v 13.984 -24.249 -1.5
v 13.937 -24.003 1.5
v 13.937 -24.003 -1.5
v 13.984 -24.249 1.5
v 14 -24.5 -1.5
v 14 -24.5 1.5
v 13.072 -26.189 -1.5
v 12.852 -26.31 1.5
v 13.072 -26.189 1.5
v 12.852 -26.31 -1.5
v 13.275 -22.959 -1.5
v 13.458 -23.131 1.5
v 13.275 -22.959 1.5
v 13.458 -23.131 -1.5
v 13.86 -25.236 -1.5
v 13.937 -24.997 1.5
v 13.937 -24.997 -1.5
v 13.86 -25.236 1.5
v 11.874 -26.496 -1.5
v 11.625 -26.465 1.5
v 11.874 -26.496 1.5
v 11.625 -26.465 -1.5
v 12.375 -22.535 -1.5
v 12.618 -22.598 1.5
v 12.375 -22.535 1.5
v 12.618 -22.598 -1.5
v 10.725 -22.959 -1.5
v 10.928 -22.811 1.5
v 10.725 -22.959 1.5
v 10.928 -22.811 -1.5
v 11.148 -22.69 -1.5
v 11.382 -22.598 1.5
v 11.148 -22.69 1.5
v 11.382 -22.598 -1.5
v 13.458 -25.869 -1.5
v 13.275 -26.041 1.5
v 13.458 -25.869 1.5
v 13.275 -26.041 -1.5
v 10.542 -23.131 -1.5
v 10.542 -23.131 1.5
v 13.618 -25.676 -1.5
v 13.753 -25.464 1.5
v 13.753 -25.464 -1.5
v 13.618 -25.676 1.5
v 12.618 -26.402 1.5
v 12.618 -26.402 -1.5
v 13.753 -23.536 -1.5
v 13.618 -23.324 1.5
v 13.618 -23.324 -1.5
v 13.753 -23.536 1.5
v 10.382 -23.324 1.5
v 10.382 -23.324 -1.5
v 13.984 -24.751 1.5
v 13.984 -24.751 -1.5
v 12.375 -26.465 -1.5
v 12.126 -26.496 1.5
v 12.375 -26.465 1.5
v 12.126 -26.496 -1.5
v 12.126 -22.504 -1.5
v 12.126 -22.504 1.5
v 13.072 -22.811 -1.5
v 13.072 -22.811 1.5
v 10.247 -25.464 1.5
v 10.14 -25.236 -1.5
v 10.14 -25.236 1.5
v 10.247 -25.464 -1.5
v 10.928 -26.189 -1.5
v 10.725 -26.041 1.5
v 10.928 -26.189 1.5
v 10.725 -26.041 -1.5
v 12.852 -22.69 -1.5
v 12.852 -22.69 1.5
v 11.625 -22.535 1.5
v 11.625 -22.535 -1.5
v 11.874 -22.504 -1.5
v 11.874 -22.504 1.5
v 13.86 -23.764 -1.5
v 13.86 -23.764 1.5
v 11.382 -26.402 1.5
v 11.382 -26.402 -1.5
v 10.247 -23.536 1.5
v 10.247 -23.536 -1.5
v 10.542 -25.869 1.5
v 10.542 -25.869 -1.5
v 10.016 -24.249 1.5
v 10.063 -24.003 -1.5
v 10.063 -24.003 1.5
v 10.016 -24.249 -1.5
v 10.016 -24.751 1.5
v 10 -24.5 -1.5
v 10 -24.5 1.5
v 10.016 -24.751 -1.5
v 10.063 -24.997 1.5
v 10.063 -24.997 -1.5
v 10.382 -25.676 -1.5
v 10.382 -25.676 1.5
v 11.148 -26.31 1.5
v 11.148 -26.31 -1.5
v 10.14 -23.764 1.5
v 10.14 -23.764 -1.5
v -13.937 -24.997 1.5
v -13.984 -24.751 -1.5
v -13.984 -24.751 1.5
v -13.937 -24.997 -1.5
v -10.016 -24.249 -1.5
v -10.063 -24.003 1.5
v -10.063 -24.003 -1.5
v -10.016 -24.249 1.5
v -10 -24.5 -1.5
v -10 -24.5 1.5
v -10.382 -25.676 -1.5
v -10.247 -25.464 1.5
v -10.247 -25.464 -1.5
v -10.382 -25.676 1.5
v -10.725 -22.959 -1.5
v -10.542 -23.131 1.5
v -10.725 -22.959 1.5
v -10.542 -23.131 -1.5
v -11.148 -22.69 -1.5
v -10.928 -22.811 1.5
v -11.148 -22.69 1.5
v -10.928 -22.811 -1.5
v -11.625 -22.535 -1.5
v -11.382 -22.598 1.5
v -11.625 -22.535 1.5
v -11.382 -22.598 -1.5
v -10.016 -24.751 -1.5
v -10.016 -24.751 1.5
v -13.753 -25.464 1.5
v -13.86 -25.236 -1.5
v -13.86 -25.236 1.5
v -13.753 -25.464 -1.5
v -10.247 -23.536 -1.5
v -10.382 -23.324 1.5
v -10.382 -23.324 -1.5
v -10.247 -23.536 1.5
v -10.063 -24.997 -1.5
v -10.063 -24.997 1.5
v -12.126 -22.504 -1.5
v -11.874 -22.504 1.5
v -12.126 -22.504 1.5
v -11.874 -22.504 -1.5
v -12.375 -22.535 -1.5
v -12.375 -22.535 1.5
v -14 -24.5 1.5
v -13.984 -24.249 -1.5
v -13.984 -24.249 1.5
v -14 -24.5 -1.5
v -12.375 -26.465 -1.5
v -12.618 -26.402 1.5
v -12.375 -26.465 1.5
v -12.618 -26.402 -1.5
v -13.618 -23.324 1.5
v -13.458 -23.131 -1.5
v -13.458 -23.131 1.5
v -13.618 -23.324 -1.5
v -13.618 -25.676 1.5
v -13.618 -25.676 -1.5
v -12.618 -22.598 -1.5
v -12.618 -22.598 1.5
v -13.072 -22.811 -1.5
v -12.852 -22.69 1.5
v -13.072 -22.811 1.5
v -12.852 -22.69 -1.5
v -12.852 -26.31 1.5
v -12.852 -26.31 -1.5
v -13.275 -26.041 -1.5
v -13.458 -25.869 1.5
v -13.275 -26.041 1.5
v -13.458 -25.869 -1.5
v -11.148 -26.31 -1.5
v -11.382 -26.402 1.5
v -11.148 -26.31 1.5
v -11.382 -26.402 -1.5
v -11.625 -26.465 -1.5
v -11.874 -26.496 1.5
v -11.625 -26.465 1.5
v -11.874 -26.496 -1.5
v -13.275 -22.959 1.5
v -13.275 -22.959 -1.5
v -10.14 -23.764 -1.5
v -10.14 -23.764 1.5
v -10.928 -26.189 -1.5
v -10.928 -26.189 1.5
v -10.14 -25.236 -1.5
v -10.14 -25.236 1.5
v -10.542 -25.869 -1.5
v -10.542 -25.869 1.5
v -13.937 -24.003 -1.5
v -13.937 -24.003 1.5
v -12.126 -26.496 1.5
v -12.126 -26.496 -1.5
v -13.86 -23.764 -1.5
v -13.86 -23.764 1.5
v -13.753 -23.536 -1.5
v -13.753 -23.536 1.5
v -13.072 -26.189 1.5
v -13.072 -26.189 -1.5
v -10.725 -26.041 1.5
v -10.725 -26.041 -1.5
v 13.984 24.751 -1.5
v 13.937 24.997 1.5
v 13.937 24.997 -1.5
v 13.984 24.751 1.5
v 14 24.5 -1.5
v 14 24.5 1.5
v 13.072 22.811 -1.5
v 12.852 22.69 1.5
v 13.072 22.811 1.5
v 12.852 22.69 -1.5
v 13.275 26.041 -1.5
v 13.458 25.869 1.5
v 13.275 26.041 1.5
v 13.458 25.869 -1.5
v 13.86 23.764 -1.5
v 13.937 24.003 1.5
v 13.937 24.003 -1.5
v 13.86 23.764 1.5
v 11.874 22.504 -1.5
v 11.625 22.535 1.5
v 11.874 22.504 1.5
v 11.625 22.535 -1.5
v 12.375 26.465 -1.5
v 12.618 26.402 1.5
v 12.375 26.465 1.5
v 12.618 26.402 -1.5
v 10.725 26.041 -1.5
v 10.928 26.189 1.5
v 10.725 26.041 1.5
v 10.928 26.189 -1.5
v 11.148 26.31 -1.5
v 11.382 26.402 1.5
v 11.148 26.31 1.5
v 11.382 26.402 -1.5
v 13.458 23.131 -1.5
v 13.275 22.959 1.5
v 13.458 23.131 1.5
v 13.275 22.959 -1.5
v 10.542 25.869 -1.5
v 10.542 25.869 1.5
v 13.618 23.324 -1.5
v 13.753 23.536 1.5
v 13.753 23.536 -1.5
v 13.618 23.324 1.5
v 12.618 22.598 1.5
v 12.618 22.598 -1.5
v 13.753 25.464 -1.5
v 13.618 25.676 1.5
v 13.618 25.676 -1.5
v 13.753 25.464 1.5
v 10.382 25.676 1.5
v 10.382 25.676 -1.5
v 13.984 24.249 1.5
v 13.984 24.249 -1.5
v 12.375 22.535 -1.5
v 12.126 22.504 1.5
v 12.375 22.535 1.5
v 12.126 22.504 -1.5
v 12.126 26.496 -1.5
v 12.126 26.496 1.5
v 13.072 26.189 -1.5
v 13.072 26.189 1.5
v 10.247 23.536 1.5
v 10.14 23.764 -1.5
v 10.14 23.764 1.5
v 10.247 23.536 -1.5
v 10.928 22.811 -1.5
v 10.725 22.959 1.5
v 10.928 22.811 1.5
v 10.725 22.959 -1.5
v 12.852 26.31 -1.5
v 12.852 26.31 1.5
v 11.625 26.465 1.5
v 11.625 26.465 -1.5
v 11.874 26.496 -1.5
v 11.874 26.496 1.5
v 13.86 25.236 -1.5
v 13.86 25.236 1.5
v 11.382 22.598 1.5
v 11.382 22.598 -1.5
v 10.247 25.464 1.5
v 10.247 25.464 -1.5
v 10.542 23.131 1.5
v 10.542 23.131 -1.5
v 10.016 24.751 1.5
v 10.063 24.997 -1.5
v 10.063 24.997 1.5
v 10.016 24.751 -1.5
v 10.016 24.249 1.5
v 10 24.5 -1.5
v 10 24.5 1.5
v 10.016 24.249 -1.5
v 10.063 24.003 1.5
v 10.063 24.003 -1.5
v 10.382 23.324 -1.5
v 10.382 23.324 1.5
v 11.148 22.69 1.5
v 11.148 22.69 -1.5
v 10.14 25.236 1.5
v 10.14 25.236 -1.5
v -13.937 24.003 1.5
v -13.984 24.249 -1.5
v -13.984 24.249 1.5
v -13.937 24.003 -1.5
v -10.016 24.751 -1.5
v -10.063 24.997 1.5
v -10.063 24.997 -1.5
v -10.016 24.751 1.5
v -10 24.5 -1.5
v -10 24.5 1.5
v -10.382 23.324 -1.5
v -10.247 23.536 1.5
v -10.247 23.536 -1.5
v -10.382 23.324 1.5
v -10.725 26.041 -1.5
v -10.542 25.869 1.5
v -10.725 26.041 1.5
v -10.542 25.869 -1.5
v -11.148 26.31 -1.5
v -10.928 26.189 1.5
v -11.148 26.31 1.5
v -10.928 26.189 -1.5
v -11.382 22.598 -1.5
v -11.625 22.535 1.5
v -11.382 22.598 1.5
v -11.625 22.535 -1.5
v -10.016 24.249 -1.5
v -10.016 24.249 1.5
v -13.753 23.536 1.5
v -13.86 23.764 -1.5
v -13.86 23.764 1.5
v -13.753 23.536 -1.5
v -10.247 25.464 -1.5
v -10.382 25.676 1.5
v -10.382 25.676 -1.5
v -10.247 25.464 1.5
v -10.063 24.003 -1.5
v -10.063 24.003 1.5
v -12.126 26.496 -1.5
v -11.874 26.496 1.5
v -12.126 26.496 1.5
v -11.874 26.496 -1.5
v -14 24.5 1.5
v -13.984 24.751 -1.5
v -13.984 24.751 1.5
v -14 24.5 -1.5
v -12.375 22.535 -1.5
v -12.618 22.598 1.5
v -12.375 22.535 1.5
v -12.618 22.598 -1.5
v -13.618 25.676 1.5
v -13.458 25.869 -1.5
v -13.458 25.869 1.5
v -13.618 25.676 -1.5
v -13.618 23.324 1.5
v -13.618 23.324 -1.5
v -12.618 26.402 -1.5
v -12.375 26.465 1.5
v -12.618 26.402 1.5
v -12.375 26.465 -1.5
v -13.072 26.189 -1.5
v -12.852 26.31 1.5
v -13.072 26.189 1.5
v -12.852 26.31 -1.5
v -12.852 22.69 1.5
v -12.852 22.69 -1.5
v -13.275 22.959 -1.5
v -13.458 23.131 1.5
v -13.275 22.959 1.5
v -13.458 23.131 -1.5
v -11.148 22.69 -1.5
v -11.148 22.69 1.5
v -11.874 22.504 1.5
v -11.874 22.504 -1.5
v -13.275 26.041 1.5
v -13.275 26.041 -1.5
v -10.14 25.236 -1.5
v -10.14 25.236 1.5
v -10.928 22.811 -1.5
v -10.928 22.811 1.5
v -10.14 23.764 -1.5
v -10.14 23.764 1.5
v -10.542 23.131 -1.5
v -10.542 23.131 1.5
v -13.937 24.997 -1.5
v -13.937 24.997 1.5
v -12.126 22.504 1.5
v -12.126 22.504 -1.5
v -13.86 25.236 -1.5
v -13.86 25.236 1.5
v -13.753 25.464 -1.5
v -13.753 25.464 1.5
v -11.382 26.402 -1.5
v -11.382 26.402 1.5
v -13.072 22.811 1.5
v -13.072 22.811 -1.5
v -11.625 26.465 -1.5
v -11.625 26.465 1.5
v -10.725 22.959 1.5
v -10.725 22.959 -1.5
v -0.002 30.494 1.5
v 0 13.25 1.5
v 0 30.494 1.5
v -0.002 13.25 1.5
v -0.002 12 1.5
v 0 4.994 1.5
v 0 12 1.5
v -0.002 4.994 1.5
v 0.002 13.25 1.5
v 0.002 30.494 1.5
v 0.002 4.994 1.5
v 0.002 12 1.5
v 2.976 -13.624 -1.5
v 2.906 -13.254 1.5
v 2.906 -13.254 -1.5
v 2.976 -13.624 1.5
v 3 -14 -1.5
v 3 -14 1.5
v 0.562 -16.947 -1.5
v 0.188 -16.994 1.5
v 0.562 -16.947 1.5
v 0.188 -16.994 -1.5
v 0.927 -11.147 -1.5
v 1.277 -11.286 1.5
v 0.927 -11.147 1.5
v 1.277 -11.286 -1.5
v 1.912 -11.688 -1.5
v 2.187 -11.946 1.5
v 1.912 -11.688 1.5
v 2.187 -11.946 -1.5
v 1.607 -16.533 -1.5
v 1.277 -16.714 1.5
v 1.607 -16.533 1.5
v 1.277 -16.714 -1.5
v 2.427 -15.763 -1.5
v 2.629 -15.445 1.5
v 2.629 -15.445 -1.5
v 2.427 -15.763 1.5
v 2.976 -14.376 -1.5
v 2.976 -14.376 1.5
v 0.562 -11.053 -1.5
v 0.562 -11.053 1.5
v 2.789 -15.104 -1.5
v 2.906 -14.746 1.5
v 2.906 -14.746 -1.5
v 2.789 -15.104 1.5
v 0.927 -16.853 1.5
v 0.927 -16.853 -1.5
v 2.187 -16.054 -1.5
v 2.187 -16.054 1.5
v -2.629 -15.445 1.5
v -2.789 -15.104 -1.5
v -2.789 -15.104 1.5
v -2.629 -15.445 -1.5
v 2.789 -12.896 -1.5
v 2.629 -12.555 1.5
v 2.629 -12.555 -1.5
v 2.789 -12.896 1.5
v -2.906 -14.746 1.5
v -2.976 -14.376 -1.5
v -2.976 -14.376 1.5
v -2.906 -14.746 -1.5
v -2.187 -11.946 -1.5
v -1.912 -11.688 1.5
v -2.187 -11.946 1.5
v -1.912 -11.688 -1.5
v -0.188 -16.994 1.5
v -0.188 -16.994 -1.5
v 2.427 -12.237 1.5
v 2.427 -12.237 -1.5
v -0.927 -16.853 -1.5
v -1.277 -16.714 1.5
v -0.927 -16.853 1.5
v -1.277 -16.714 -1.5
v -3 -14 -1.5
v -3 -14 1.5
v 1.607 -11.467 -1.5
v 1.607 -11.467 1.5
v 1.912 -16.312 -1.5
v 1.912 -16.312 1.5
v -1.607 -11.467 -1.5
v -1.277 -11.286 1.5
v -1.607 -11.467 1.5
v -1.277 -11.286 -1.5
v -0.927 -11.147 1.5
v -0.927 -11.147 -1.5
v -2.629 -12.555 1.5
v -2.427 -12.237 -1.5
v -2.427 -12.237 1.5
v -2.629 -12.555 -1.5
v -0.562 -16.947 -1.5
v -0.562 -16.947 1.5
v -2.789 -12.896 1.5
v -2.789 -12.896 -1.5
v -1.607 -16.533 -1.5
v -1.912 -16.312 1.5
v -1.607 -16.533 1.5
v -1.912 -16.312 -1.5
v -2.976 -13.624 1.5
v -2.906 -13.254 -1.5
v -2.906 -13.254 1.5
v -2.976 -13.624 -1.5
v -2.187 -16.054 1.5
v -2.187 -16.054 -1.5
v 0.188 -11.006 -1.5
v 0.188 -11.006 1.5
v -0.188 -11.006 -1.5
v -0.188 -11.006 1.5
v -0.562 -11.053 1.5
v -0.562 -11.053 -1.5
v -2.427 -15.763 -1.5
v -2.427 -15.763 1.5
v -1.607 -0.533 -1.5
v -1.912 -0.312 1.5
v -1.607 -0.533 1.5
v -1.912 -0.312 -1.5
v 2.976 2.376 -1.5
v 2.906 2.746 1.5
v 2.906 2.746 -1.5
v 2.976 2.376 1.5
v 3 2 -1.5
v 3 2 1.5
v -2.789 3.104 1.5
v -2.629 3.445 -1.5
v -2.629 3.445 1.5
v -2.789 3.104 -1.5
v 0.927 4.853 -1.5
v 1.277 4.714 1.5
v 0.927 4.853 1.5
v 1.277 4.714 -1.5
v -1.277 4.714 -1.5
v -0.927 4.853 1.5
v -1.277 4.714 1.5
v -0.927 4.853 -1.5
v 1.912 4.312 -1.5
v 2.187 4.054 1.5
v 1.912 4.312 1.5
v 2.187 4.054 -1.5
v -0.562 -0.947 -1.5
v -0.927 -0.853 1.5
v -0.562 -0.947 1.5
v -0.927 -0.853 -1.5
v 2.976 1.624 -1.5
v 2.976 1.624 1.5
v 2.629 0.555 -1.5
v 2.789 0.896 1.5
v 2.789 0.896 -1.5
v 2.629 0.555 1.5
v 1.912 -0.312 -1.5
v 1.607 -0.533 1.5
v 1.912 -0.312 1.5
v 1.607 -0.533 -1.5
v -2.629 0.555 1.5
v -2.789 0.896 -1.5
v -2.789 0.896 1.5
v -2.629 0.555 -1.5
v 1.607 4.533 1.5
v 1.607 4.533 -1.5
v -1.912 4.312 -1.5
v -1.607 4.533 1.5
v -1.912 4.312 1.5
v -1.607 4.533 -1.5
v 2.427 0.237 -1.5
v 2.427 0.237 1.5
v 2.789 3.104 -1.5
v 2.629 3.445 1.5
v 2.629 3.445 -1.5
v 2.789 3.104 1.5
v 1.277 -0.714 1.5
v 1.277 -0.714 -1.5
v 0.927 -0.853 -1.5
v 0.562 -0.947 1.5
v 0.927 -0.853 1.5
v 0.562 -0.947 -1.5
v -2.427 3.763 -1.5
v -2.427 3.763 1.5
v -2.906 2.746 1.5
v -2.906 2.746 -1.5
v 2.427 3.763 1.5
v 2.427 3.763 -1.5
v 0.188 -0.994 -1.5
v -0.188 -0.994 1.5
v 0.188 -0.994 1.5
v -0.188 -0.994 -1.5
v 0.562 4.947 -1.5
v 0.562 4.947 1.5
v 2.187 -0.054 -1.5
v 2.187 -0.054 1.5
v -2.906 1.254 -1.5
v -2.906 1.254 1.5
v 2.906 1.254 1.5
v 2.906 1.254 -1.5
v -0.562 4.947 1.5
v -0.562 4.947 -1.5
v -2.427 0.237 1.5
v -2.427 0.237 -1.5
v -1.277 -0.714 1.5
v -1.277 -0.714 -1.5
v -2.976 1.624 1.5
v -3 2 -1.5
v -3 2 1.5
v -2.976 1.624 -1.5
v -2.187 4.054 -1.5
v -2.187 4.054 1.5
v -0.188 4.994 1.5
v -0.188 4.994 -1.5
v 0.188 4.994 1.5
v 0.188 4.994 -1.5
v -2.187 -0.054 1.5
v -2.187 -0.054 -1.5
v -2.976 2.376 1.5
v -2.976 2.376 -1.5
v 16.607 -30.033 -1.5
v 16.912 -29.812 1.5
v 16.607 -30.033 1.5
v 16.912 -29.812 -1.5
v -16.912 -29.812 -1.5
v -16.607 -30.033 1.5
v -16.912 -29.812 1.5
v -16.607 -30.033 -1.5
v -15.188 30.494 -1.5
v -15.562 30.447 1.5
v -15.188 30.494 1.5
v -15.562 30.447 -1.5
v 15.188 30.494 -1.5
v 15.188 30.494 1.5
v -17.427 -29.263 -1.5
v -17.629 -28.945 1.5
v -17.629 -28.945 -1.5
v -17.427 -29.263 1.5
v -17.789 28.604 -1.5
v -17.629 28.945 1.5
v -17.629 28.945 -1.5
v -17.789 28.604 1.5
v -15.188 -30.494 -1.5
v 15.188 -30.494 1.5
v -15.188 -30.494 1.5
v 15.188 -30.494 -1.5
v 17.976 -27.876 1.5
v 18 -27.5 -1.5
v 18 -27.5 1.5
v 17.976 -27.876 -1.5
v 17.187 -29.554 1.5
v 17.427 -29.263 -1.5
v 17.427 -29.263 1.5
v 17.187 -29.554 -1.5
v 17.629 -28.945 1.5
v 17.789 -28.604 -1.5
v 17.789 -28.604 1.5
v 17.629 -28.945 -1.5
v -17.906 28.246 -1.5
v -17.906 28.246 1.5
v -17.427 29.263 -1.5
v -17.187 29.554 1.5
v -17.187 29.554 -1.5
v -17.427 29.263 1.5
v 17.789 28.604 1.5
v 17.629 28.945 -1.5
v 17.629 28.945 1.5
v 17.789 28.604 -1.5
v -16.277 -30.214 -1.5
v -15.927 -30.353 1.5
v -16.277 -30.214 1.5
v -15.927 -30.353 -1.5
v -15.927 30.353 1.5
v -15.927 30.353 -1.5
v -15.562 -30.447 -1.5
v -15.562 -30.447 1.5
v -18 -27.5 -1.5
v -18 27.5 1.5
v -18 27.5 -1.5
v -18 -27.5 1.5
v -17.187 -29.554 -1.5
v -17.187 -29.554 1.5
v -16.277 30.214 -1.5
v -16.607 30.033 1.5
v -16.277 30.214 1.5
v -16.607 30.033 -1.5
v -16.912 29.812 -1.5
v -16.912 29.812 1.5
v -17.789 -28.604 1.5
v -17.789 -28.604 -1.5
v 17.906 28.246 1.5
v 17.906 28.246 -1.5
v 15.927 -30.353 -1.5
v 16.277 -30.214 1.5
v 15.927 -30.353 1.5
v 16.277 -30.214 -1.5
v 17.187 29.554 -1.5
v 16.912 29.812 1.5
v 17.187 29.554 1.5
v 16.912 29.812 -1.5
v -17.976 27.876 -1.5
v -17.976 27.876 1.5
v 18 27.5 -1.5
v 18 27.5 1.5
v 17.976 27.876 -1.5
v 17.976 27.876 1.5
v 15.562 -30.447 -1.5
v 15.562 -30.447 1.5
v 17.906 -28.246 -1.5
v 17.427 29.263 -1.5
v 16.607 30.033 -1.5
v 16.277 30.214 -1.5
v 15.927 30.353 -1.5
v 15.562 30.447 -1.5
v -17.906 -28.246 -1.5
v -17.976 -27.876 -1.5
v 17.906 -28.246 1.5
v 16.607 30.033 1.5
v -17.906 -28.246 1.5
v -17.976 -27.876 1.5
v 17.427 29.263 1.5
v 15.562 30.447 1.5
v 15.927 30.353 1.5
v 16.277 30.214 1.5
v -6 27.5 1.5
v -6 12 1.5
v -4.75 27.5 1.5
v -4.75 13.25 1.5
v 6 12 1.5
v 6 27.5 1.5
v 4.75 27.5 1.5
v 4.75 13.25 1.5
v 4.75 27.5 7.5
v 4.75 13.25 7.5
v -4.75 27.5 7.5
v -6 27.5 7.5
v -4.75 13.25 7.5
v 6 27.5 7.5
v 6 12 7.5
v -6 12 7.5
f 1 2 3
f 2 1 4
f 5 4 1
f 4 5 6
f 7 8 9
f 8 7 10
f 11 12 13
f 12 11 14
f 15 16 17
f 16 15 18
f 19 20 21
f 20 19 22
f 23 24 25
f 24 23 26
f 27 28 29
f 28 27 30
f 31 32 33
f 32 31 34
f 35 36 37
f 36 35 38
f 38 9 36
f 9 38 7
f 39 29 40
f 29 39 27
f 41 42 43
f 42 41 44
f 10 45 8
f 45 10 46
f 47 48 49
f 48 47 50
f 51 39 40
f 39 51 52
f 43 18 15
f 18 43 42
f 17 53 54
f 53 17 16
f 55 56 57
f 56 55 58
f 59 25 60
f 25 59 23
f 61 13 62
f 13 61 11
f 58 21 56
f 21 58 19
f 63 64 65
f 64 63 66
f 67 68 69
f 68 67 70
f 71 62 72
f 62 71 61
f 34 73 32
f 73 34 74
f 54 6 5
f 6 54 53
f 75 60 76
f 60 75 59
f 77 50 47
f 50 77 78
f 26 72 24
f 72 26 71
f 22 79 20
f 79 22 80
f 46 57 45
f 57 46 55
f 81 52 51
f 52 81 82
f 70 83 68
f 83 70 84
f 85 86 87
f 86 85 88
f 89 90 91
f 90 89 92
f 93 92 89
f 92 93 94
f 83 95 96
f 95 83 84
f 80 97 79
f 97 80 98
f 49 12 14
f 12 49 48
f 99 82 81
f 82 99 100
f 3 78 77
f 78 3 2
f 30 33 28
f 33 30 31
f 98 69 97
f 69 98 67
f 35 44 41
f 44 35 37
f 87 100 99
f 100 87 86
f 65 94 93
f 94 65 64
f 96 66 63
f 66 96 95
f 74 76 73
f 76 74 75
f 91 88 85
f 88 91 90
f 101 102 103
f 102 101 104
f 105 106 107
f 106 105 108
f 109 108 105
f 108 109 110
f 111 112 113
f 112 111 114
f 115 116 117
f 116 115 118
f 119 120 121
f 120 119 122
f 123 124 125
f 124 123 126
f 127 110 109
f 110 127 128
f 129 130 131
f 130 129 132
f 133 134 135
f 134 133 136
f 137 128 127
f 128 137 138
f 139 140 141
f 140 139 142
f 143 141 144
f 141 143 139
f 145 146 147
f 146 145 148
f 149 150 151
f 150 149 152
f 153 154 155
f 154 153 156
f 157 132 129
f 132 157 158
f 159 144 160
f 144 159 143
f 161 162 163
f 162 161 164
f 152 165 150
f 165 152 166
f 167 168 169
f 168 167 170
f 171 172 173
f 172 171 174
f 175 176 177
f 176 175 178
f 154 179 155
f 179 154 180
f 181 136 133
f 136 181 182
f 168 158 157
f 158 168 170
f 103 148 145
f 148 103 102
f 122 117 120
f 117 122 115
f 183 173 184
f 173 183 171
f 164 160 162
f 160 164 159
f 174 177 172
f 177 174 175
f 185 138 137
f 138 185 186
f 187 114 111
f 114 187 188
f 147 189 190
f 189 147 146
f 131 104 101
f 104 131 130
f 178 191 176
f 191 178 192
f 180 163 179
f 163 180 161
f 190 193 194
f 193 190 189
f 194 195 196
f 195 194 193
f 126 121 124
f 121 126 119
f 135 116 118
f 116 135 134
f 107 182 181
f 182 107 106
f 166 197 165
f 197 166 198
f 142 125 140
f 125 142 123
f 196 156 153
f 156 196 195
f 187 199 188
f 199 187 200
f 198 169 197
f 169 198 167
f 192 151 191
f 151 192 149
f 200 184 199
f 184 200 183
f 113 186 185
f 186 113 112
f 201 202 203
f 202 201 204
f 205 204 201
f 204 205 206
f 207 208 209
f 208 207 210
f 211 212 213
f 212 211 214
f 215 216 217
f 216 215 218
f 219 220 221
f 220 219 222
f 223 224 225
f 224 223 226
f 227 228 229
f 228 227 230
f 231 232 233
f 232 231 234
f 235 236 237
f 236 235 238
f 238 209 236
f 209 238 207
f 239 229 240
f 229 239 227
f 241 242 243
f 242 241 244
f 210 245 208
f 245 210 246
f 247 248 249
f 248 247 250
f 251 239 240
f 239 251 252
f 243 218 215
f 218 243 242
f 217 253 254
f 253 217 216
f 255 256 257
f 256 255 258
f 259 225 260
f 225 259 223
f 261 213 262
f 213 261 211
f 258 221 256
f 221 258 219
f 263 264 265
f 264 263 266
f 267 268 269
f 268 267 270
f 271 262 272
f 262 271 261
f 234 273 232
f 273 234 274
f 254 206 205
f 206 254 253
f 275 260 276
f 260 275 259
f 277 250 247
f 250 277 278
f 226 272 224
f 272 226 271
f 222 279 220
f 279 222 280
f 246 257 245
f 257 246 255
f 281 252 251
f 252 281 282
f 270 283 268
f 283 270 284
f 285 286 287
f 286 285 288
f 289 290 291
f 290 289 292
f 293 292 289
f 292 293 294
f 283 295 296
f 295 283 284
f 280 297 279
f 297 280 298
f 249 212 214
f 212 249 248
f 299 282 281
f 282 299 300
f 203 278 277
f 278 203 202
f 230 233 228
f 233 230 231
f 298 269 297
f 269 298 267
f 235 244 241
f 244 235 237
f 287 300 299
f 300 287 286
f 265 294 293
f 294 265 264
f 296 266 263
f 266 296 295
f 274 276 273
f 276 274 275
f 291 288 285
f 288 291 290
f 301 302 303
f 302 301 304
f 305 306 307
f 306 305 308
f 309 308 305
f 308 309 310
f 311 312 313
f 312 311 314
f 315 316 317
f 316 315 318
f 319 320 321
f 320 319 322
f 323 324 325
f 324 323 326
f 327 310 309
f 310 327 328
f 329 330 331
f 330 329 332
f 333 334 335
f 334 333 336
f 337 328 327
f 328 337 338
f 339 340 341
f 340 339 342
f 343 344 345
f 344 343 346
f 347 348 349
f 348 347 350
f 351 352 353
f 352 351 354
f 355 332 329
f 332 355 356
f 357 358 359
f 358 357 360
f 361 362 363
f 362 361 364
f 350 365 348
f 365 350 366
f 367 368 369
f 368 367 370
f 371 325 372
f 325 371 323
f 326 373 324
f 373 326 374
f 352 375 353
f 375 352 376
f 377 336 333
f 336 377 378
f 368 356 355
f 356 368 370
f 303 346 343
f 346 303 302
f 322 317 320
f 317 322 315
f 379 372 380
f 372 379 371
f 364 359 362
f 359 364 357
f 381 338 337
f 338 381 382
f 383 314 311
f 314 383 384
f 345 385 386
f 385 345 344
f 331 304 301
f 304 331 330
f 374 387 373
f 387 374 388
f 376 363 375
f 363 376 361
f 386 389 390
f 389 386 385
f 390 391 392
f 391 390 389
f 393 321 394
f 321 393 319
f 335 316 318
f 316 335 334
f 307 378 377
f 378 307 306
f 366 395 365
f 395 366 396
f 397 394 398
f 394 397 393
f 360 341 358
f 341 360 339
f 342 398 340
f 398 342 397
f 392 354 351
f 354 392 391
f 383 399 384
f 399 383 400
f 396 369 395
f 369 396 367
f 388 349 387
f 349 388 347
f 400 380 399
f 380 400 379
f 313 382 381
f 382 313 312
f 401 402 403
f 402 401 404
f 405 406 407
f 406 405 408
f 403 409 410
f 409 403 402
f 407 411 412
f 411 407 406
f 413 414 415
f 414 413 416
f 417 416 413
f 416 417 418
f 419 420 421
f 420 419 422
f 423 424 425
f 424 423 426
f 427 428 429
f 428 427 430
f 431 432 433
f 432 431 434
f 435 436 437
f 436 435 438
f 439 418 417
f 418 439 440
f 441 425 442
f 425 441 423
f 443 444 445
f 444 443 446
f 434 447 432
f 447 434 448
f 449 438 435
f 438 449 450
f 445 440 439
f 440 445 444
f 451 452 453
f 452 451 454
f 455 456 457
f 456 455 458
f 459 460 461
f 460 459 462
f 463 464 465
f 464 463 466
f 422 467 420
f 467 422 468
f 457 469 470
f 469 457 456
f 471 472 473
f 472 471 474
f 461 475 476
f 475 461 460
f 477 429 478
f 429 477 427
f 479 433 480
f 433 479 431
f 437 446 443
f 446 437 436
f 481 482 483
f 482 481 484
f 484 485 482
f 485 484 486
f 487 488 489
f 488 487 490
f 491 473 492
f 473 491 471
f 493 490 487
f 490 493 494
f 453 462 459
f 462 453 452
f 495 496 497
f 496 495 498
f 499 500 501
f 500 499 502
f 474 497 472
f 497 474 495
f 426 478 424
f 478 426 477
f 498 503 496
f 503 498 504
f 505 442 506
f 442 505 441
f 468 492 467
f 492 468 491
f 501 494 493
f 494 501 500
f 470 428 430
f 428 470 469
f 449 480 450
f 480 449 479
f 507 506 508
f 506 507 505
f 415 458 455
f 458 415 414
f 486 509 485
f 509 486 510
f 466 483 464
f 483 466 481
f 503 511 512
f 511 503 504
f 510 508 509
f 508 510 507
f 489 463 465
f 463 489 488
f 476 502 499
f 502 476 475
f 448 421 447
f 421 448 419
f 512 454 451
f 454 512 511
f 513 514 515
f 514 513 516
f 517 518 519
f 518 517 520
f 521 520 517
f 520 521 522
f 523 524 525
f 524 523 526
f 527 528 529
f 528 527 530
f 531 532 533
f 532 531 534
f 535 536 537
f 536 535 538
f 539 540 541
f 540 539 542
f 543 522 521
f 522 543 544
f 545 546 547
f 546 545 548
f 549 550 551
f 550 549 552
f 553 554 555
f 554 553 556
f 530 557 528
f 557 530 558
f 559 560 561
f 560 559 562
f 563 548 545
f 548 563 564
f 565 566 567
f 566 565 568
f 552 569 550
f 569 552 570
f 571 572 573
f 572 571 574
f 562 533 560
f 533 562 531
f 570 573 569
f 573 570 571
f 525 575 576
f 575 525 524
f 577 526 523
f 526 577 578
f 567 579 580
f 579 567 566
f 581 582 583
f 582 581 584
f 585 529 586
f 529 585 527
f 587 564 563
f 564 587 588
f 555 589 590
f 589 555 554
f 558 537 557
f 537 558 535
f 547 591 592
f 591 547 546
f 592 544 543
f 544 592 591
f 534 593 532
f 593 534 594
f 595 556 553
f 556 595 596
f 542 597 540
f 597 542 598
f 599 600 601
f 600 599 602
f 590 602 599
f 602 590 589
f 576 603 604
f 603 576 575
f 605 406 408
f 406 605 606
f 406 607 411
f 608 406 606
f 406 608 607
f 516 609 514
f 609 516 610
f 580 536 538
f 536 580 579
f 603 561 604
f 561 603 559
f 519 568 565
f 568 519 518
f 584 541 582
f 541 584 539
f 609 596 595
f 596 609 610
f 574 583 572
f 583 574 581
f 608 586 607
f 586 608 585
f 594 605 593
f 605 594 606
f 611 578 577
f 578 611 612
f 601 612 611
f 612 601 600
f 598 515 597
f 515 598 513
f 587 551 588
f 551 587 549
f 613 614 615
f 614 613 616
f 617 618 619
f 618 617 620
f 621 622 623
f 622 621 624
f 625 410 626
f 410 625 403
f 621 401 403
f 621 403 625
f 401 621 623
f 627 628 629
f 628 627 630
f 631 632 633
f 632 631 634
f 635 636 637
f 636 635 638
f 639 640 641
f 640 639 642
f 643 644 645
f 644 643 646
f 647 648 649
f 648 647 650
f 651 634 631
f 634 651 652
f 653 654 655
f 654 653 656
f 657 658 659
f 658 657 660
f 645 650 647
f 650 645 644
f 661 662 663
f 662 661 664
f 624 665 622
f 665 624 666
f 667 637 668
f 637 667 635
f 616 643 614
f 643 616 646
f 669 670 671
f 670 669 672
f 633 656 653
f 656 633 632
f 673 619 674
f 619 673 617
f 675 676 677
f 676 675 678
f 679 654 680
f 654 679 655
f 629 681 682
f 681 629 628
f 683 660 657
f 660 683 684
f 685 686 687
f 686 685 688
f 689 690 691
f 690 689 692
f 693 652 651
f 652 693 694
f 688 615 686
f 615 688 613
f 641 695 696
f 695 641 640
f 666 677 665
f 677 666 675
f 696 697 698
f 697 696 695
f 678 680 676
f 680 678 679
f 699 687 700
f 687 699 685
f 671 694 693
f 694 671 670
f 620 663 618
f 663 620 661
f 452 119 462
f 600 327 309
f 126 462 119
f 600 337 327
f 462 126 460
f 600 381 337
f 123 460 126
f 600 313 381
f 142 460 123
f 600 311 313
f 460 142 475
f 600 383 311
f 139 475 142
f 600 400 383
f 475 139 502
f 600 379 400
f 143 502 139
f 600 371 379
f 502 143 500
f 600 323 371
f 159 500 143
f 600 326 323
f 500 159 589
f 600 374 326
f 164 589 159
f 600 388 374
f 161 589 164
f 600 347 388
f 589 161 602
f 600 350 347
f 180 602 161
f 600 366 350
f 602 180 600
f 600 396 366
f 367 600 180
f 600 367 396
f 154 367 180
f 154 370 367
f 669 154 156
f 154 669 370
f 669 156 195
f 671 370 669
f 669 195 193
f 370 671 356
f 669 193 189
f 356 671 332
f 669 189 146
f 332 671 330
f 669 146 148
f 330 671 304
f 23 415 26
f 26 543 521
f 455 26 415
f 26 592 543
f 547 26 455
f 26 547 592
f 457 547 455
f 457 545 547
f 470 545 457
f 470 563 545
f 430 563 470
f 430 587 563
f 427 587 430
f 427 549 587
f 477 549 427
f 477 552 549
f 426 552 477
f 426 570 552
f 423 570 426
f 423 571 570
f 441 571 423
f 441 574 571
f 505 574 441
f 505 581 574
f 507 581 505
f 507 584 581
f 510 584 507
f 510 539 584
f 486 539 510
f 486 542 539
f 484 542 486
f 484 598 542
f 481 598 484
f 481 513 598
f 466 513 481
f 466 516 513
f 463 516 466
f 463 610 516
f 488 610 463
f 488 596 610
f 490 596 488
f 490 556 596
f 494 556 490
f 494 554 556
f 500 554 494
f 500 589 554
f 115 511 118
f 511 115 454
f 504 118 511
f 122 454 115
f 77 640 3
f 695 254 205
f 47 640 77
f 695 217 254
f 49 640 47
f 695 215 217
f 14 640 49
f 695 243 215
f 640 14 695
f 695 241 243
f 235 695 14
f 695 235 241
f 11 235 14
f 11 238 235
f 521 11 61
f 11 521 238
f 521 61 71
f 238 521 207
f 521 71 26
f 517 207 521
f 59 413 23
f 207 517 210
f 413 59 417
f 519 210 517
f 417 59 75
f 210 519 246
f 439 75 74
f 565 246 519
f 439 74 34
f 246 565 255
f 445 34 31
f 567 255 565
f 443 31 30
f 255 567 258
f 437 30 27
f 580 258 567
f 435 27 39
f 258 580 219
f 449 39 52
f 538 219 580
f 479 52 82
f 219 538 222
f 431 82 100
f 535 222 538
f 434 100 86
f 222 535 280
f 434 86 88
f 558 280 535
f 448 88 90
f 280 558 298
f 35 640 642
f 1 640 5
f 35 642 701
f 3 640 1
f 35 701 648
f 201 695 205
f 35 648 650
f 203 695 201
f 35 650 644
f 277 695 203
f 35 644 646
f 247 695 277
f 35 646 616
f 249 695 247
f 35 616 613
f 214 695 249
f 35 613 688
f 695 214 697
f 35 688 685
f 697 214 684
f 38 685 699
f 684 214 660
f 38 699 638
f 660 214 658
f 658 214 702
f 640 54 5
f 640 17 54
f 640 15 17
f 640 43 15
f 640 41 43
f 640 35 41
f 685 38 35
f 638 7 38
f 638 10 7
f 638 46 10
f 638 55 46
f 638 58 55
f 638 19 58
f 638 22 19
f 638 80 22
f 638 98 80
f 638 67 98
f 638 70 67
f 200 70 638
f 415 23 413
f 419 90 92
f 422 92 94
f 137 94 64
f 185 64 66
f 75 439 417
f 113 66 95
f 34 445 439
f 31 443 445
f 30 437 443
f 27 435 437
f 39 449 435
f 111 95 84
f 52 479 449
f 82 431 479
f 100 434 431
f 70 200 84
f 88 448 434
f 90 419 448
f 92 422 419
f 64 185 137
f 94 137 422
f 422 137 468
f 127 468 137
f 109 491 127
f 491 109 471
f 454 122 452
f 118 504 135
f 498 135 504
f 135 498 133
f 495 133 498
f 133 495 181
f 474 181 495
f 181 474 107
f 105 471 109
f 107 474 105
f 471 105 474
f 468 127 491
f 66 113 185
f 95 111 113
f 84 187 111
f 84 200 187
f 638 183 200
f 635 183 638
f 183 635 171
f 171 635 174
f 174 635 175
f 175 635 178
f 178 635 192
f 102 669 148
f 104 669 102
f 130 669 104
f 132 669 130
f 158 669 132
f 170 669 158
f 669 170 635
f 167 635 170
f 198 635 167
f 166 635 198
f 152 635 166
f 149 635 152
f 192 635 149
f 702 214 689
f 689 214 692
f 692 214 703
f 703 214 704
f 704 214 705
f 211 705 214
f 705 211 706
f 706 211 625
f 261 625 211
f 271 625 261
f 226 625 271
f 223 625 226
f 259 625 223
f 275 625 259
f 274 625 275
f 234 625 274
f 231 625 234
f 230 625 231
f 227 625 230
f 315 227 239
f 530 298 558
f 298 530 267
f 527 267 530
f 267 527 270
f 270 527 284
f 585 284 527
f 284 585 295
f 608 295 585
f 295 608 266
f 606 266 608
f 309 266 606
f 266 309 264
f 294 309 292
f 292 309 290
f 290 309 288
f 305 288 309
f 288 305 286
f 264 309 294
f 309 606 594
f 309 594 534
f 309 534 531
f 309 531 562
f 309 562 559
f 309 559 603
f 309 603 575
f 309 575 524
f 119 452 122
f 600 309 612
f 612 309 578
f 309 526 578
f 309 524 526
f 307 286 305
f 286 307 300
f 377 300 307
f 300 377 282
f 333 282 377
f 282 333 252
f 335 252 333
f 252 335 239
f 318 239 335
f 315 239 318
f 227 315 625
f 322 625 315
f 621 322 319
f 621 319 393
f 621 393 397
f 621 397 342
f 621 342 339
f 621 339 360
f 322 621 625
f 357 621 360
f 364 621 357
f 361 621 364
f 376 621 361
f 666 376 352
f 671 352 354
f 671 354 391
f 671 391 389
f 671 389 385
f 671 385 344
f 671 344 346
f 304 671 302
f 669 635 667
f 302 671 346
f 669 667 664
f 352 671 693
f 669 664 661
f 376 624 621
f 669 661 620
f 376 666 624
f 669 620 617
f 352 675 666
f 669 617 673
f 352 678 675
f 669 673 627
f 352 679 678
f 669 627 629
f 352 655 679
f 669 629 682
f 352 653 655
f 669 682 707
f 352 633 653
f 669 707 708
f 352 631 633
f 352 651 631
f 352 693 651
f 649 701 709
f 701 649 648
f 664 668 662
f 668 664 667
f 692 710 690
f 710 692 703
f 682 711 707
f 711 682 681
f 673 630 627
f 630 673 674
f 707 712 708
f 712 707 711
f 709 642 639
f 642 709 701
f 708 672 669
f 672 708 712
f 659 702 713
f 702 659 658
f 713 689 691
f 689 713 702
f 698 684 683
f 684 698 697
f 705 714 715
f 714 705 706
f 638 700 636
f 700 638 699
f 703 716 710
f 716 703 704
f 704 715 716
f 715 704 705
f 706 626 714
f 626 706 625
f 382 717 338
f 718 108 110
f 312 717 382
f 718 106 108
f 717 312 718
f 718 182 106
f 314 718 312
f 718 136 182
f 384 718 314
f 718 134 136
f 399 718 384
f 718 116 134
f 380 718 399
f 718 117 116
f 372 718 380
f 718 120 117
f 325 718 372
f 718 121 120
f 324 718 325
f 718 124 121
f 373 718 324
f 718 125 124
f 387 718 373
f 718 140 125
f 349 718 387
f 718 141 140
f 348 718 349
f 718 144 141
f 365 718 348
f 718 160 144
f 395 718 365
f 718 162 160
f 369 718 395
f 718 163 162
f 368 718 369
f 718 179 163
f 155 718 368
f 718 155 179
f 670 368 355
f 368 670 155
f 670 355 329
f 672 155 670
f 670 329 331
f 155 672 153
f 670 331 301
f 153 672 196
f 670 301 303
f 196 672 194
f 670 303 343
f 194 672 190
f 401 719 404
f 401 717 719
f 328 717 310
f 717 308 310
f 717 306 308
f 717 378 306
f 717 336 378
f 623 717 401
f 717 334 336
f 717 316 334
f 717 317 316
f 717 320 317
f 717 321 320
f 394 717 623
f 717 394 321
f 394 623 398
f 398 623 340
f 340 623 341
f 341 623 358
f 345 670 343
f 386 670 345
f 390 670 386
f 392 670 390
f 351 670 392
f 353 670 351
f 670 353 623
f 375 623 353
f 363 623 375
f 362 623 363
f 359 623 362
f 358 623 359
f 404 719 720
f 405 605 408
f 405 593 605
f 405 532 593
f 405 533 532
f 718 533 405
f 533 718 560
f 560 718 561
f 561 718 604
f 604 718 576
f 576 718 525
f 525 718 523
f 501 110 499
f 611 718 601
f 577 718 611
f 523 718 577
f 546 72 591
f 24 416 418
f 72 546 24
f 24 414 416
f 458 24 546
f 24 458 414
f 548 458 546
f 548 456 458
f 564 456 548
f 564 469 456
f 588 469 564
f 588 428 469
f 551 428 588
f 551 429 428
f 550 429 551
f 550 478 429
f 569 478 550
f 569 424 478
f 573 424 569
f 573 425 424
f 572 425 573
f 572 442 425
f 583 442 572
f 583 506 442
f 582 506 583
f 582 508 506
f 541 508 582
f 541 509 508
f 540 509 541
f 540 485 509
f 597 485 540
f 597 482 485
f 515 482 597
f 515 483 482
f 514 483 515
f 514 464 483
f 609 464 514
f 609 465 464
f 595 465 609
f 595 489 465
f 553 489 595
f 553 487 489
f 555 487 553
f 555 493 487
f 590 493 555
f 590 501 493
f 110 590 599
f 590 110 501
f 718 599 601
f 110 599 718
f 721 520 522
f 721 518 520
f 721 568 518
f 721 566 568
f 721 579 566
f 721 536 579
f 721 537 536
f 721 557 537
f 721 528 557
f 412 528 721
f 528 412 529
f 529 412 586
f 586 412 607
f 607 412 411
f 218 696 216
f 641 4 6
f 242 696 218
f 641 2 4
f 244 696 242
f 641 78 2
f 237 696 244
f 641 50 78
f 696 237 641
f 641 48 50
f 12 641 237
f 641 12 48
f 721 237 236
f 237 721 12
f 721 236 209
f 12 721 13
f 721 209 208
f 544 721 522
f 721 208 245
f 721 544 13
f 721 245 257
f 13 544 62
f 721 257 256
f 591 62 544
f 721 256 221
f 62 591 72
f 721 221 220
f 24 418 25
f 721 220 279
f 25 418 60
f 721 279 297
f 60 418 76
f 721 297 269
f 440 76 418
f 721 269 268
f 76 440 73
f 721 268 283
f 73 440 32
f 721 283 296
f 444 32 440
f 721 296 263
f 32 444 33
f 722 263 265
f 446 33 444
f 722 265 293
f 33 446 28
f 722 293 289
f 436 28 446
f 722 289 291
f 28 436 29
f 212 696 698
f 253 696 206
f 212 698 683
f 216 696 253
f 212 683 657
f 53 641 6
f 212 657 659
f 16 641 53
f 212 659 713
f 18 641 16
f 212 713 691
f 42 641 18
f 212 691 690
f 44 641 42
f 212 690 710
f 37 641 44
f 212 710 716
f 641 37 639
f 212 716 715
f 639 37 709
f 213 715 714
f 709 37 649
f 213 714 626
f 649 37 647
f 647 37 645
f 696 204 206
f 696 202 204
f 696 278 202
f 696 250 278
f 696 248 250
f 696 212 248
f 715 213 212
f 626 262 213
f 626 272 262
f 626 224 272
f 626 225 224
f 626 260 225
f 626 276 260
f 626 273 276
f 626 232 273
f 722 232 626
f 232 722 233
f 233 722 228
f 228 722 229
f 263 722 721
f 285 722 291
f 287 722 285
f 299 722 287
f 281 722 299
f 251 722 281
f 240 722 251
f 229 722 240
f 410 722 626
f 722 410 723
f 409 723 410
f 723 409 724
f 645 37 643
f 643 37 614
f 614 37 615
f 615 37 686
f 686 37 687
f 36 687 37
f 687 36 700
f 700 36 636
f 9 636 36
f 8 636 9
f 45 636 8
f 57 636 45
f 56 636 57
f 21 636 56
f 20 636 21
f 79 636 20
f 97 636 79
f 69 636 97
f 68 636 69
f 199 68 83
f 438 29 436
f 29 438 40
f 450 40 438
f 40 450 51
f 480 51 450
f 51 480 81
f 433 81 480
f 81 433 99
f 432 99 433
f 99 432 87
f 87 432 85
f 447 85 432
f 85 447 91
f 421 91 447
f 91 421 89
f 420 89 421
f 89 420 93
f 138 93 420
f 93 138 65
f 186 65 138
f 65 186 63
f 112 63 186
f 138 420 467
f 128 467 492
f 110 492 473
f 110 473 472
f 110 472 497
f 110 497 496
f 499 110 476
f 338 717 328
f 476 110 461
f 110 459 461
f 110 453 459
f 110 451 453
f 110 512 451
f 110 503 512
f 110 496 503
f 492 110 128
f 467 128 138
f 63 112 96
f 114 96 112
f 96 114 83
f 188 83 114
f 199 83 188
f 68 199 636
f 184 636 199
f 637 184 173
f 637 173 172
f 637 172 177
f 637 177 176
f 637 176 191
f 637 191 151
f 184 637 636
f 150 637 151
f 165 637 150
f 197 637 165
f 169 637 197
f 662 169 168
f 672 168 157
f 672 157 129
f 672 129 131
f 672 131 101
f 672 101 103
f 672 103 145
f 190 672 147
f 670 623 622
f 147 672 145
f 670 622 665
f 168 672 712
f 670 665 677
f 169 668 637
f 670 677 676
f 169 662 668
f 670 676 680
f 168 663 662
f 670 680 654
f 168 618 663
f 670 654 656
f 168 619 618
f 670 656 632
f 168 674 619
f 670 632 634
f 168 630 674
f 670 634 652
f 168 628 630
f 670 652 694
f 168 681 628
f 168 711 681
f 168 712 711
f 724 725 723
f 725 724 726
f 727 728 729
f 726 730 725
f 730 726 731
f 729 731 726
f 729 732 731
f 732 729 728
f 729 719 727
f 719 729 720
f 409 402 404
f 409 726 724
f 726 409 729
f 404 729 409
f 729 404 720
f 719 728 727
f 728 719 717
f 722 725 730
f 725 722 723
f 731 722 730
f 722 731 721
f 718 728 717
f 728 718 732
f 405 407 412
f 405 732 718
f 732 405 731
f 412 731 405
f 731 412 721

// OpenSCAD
use <MCAD/shapes.scad>


height=10;
width=10;
highquality=50;
lowquality=10;
minimalheight=0.0001;

module hexknob(myheight,mywidth,rounded,showref,quality){

widthmodifier=0.6;

$fn=quality;

if(showref){
translate([mywidth*1.5,0,0])
hexagon(mywidth,myheight);

}

if(rounded)
{



//$fn=50;
minkowski()
{
hexagon(mywidth*widthmodifier,myheight);
cylinder(r=2,h=minimalheight);
}

}
else
{
hexagon(mywidth,myheight);

}


}


module knobinsert(){

basewidth=30;
baseheight=20;
insertheight=80;
insertwidth=20;
fudgefactor=17; //8,14,20,17
fudgefactor2=8; //8,10,8 



intersection(){

cylinder(r= (basewidth+fudgefactor)/2,h=insertheight);


translate([0,0,(insertheight/2)   ])
cube([basewidth*2, insertwidth+fudgefactor2, insertheight], center = true);


}

cylinder(r=(basewidth+fudgefactor)/2,h=baseheight);
}


module makehousing(isLid)
{

scalefactor1=0.9;
scalefactor2=0.94;
powerholderheight=6;
powerholderlength=14;
powerholderwidth=9;
fudgefactor=0.5;
powerholdershell=3;
caselength=55;

caselidheight=3;
caselidthickness=3;


powerholderoffset=7;
if(isLid)
{

union(){
house(caselidheight,caselidheight,caselength,true,true);



difference(){


translate([0,caselength/2-powerholderoffset,(powerholderheight/2) +(caselidheight/2) ])
cube([powerholderwidth+powerholdershell,powerholderlength+powerholdershell, powerholderheight], center = true);


union(){

translate([0,caselength/2-powerholderoffset,(powerholderheight/2) +(caselidheight/2) ])
cube([powerholderwidth+fudgefactor,powerholderlength+fudgefactor, powerholderheight], center = true);



translate([0,caselength/2+8,(powerholderheight/2) +(caselidheight/2) ])
cube([25,16,10], center = true);

}


}
}
}

else{
difference(){

house(20,caselidheight,caselength,true);

translate([0,0,caselidheight])
	{
	scale([scalefactor1,scalefactor2,1])
		{
		house(20,caselidheight,caselength,false);
		}
	}

}

}

}

module house(caseheight,caselidheight,caselength,doScrews,isLid)
{

cpuwidth=18;
cpuheight=10;
cpulength=49;

casewidth=30;
caseboxheight=22;  //

$fn = 50;
screwholewidth = 3;
bigscrewholewidth = 5;
bigheight=300;

fudgefactor=1;


lidslit=3;

screwhole_y=casewidth/2 - screwholewidth;
screwhole_x=caselength/2 - screwholewidth;;
lidscrewhole_y=8;
lidscrewhole_offset=6;

docenter=true;

screwshell=6;


difference(){



union()
{


	minkowski()
	{
	cube([casewidth,caselength, caseheight], center = true);
	cylinder(r=3,h=minimalheight);
	}

}

if(doScrews)
{

union()
	{

	translate([screwhole_y,-screwhole_x,0])
	cylinder(r=(screwholewidth+fudgefactor)/2,h=bigheight,center=docenter);


	translate([-screwhole_y,-screwhole_x,0])
	cylinder(r=(screwholewidth+fudgefactor)/2,h=bigheight,center=docenter);


	translate([screwhole_y,screwhole_x,0])
	cylinder(r=(screwholewidth+fudgefactor)/2,h=bigheight,center=docenter);

	translate([-screwhole_y,screwhole_x,0])
	cylinder(r=(screwholewidth+fudgefactor)/2,h=bigheight,center=docenter);


	translate([0,0,caselidheight+2])
	rotate([0,90,90])
	cylinder(r=(bigscrewholewidth/2+fudgefactor),h=bigheight*2,center=false);


	if(!isLid)
		{

	
		translate([0,-30,(caseheight/2) - (lidslit/2)])
		cube([11,10,lidslit], center=true);

		}


	}

}


if(isLid)
	{
	translate([0,-lidscrewhole_y - lidscrewhole_offset,0])
	cylinder(r=(bigscrewholewidth/2+fudgefactor/2),h=bigheight,center=docenter);

	translate([0,lidscrewhole_y-lidscrewhole_offset,0])
	cylinder(r=(bigscrewholewidth/2+fudgefactor/2),h=bigheight,center=docenter);
	}


}

}


module makeknob()
{
scalefactor = 0.10;

difference(){
	translate([0,0,(height/2)   ])
	hexknob(height,width,true,false,highquality);
	//hexknob(height,width,false,false,lowquality);
	   scale([scalefactor,scalefactor,scalefactor ]) 
			knobinsert();	
	}	


//knobinsert();
}



makehousing(true);
//makeknob();
